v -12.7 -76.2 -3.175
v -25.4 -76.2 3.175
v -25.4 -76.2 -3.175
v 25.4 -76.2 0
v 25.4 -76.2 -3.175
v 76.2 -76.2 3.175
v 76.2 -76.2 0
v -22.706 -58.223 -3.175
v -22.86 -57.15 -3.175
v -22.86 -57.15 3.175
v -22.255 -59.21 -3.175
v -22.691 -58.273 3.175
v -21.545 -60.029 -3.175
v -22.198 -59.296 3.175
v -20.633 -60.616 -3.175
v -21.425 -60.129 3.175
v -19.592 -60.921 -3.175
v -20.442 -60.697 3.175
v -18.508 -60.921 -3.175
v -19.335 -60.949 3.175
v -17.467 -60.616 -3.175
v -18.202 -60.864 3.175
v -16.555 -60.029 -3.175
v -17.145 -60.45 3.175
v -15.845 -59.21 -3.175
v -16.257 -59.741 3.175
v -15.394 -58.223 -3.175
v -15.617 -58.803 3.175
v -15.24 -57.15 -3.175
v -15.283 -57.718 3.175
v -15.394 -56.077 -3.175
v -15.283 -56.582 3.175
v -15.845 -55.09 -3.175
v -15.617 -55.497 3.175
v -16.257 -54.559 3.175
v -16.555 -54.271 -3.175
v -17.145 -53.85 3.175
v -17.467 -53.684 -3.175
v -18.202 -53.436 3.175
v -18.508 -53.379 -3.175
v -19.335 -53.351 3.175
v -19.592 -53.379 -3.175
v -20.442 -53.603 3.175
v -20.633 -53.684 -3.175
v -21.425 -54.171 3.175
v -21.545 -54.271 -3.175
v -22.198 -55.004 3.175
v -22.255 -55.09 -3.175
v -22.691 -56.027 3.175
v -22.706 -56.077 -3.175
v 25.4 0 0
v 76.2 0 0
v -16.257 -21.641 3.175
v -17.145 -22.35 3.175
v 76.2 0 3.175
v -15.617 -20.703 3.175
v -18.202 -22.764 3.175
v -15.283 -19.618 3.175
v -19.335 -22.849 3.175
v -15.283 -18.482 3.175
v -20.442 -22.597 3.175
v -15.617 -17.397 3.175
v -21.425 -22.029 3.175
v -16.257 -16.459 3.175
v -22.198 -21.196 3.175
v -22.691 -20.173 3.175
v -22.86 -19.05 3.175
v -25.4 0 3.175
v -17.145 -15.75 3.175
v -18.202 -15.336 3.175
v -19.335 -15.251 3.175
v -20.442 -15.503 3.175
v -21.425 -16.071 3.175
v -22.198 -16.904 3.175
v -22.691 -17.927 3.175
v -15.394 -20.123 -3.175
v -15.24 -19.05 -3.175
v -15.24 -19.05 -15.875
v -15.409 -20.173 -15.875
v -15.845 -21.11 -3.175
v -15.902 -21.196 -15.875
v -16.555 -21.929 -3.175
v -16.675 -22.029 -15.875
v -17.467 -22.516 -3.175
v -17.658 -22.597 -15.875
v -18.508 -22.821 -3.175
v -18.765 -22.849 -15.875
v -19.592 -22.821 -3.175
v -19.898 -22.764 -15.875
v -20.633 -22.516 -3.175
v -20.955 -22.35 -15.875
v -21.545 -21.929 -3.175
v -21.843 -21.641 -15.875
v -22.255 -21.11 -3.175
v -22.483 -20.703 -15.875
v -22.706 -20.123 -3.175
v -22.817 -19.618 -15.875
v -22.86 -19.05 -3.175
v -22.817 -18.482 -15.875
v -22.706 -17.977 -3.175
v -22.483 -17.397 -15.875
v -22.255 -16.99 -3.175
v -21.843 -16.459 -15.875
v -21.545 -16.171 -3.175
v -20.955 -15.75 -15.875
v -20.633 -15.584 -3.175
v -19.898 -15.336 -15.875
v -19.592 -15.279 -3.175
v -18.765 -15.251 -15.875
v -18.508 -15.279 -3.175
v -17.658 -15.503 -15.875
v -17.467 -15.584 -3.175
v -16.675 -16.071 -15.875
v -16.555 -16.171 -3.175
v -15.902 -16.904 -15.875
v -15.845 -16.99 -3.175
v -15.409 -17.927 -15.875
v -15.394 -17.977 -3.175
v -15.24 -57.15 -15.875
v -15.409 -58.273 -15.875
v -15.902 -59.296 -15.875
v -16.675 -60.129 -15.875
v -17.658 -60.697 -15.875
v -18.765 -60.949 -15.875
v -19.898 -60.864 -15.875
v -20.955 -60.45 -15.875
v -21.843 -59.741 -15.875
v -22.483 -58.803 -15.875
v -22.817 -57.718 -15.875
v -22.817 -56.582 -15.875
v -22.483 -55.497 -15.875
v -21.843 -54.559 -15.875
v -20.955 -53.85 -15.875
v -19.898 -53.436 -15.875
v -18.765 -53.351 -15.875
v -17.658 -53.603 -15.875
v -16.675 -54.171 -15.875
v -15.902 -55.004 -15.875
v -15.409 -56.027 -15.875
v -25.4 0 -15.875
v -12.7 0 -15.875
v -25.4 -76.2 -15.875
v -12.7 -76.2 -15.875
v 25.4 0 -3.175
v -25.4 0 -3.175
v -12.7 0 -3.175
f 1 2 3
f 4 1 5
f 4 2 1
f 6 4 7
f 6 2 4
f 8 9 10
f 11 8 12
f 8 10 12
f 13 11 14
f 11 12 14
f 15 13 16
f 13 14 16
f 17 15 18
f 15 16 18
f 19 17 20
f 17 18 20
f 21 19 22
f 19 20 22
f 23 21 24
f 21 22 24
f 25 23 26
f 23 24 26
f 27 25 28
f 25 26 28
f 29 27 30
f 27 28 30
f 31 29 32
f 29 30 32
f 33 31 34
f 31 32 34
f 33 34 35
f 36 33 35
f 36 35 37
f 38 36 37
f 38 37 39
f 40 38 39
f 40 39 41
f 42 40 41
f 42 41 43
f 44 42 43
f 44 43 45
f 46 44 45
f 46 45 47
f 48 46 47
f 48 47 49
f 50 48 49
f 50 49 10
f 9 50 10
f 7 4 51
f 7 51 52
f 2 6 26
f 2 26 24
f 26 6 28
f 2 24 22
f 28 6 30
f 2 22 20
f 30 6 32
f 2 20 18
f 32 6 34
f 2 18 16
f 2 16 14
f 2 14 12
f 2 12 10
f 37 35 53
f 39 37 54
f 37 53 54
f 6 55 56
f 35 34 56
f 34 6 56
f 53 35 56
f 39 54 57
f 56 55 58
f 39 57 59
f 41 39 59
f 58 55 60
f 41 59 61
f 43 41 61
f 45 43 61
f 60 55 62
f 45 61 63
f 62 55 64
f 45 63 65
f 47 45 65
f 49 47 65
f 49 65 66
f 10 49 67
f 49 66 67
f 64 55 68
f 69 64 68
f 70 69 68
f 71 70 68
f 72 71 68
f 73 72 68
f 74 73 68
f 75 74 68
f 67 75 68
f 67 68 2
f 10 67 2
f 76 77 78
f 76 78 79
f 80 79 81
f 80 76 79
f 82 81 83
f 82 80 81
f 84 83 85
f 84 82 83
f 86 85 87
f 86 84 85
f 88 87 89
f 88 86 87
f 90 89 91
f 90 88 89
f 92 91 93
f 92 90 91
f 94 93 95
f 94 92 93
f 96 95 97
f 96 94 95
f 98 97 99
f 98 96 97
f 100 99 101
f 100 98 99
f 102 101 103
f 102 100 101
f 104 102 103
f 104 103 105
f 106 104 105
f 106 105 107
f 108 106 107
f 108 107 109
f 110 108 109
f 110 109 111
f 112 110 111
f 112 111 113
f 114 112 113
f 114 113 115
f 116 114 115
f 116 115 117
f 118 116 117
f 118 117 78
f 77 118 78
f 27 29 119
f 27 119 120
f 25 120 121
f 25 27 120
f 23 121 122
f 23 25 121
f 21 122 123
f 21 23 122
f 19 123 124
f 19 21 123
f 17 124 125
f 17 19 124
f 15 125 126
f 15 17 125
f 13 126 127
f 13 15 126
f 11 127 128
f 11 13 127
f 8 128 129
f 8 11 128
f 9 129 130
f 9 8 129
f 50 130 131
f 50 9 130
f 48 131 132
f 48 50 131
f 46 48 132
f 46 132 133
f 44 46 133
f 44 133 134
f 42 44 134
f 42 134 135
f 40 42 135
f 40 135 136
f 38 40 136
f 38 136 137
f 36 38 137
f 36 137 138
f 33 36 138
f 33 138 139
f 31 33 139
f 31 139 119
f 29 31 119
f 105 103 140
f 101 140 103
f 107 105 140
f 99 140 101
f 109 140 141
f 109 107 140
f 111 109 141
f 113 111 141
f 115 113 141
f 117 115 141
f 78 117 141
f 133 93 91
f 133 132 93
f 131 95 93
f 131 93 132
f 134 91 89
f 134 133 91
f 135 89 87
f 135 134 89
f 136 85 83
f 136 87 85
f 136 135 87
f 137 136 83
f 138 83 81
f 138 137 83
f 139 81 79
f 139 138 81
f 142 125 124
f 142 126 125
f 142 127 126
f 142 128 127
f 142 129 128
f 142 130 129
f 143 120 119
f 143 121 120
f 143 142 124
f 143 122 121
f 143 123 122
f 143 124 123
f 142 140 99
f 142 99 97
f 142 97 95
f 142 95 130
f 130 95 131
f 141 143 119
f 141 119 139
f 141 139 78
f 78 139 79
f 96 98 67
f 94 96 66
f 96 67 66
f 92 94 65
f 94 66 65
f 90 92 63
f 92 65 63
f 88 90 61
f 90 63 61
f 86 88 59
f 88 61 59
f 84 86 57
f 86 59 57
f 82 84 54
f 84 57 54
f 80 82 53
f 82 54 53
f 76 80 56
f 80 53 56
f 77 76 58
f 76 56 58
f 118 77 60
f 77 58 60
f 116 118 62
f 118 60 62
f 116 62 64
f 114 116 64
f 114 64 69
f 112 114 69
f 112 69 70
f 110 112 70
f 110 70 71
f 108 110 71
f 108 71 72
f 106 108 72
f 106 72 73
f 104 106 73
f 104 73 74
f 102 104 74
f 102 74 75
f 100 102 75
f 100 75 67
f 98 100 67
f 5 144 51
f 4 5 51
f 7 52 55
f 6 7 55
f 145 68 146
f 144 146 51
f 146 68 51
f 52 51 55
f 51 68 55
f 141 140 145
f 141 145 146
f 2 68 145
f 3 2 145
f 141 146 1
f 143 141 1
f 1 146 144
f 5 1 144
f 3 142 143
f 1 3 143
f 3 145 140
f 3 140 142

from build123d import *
from build123d import SkipClean  # not in build123d's __all__

# Parameters (mm, degrees)
F0_W     = 50.8
F0_H     = 3.175
F1_DEPTH = 76.2
F3_DEPTH = 6.351
F4_W     = 12.7
F4_H     = 76.2
F4_R     = 3.81
F5_DEPTH = 12.7


with BuildPart() as f1:
    # F0 (on Front) → F1 (new body)
    with BuildSketch(Plane.XZ):
        Polygon((25.4, 3.175), (-25.4, 3.175), (-25.4, -3.175), (25.4, -3.175), (25.4, 0), align=None)
        with Locations((50.8, 1.5875)):
            Rectangle(F0_W, F0_H)
    extrude(amount=F1_DEPTH)

    # F2 (on face) → F3 (cut, through all)
    with BuildSketch(Plane.XY.offset(3.175)):
        with BuildLine():
            Line((-22.86, -19.05), (-15.24, -19.05))
            ThreePointArc((-15.24, -19.05), (-19.05, -15.24), (-22.86, -19.05))
        make_face()
        with BuildLine():
            ThreePointArc((-22.86, -19.05), (-19.05, -22.86), (-15.24, -19.05))
            Line((-15.24, -19.05), (-22.86, -19.05))
        make_face()
        with BuildLine():
            Line((-22.86, -57.15), (-15.24, -57.15))
            ThreePointArc((-15.24, -57.15), (-19.05, -53.34), (-22.86, -57.15))
        make_face()
        with BuildLine():
            ThreePointArc((-22.86, -57.15), (-19.05, -60.96), (-15.24, -57.15))
            Line((-15.24, -57.15), (-22.86, -57.15))
        make_face()
    extrude(amount=-F3_DEPTH, mode=Mode.SUBTRACT)

    # F4 (on face) → F5 (join)
    with BuildSketch(Plane(origin=(0, 0, -3.175), x_dir=(1, 0, 0), z_dir=(0, 0, -1))):
        with Locations((-19.05, 38.1)):
            Rectangle(F4_W, F4_H)
        with Locations((-19.05, 19.05)):
            Circle(F4_R, mode=Mode.SUBTRACT)
        with Locations((-19.05, 57.15)):
            Circle(F4_R, mode=Mode.SUBTRACT)
    with SkipClean():  # cleaning this boolean's faces spoils the solid; the shape is the same uncleaned
        extrude(amount=F5_DEPTH)


solid = f1.part
